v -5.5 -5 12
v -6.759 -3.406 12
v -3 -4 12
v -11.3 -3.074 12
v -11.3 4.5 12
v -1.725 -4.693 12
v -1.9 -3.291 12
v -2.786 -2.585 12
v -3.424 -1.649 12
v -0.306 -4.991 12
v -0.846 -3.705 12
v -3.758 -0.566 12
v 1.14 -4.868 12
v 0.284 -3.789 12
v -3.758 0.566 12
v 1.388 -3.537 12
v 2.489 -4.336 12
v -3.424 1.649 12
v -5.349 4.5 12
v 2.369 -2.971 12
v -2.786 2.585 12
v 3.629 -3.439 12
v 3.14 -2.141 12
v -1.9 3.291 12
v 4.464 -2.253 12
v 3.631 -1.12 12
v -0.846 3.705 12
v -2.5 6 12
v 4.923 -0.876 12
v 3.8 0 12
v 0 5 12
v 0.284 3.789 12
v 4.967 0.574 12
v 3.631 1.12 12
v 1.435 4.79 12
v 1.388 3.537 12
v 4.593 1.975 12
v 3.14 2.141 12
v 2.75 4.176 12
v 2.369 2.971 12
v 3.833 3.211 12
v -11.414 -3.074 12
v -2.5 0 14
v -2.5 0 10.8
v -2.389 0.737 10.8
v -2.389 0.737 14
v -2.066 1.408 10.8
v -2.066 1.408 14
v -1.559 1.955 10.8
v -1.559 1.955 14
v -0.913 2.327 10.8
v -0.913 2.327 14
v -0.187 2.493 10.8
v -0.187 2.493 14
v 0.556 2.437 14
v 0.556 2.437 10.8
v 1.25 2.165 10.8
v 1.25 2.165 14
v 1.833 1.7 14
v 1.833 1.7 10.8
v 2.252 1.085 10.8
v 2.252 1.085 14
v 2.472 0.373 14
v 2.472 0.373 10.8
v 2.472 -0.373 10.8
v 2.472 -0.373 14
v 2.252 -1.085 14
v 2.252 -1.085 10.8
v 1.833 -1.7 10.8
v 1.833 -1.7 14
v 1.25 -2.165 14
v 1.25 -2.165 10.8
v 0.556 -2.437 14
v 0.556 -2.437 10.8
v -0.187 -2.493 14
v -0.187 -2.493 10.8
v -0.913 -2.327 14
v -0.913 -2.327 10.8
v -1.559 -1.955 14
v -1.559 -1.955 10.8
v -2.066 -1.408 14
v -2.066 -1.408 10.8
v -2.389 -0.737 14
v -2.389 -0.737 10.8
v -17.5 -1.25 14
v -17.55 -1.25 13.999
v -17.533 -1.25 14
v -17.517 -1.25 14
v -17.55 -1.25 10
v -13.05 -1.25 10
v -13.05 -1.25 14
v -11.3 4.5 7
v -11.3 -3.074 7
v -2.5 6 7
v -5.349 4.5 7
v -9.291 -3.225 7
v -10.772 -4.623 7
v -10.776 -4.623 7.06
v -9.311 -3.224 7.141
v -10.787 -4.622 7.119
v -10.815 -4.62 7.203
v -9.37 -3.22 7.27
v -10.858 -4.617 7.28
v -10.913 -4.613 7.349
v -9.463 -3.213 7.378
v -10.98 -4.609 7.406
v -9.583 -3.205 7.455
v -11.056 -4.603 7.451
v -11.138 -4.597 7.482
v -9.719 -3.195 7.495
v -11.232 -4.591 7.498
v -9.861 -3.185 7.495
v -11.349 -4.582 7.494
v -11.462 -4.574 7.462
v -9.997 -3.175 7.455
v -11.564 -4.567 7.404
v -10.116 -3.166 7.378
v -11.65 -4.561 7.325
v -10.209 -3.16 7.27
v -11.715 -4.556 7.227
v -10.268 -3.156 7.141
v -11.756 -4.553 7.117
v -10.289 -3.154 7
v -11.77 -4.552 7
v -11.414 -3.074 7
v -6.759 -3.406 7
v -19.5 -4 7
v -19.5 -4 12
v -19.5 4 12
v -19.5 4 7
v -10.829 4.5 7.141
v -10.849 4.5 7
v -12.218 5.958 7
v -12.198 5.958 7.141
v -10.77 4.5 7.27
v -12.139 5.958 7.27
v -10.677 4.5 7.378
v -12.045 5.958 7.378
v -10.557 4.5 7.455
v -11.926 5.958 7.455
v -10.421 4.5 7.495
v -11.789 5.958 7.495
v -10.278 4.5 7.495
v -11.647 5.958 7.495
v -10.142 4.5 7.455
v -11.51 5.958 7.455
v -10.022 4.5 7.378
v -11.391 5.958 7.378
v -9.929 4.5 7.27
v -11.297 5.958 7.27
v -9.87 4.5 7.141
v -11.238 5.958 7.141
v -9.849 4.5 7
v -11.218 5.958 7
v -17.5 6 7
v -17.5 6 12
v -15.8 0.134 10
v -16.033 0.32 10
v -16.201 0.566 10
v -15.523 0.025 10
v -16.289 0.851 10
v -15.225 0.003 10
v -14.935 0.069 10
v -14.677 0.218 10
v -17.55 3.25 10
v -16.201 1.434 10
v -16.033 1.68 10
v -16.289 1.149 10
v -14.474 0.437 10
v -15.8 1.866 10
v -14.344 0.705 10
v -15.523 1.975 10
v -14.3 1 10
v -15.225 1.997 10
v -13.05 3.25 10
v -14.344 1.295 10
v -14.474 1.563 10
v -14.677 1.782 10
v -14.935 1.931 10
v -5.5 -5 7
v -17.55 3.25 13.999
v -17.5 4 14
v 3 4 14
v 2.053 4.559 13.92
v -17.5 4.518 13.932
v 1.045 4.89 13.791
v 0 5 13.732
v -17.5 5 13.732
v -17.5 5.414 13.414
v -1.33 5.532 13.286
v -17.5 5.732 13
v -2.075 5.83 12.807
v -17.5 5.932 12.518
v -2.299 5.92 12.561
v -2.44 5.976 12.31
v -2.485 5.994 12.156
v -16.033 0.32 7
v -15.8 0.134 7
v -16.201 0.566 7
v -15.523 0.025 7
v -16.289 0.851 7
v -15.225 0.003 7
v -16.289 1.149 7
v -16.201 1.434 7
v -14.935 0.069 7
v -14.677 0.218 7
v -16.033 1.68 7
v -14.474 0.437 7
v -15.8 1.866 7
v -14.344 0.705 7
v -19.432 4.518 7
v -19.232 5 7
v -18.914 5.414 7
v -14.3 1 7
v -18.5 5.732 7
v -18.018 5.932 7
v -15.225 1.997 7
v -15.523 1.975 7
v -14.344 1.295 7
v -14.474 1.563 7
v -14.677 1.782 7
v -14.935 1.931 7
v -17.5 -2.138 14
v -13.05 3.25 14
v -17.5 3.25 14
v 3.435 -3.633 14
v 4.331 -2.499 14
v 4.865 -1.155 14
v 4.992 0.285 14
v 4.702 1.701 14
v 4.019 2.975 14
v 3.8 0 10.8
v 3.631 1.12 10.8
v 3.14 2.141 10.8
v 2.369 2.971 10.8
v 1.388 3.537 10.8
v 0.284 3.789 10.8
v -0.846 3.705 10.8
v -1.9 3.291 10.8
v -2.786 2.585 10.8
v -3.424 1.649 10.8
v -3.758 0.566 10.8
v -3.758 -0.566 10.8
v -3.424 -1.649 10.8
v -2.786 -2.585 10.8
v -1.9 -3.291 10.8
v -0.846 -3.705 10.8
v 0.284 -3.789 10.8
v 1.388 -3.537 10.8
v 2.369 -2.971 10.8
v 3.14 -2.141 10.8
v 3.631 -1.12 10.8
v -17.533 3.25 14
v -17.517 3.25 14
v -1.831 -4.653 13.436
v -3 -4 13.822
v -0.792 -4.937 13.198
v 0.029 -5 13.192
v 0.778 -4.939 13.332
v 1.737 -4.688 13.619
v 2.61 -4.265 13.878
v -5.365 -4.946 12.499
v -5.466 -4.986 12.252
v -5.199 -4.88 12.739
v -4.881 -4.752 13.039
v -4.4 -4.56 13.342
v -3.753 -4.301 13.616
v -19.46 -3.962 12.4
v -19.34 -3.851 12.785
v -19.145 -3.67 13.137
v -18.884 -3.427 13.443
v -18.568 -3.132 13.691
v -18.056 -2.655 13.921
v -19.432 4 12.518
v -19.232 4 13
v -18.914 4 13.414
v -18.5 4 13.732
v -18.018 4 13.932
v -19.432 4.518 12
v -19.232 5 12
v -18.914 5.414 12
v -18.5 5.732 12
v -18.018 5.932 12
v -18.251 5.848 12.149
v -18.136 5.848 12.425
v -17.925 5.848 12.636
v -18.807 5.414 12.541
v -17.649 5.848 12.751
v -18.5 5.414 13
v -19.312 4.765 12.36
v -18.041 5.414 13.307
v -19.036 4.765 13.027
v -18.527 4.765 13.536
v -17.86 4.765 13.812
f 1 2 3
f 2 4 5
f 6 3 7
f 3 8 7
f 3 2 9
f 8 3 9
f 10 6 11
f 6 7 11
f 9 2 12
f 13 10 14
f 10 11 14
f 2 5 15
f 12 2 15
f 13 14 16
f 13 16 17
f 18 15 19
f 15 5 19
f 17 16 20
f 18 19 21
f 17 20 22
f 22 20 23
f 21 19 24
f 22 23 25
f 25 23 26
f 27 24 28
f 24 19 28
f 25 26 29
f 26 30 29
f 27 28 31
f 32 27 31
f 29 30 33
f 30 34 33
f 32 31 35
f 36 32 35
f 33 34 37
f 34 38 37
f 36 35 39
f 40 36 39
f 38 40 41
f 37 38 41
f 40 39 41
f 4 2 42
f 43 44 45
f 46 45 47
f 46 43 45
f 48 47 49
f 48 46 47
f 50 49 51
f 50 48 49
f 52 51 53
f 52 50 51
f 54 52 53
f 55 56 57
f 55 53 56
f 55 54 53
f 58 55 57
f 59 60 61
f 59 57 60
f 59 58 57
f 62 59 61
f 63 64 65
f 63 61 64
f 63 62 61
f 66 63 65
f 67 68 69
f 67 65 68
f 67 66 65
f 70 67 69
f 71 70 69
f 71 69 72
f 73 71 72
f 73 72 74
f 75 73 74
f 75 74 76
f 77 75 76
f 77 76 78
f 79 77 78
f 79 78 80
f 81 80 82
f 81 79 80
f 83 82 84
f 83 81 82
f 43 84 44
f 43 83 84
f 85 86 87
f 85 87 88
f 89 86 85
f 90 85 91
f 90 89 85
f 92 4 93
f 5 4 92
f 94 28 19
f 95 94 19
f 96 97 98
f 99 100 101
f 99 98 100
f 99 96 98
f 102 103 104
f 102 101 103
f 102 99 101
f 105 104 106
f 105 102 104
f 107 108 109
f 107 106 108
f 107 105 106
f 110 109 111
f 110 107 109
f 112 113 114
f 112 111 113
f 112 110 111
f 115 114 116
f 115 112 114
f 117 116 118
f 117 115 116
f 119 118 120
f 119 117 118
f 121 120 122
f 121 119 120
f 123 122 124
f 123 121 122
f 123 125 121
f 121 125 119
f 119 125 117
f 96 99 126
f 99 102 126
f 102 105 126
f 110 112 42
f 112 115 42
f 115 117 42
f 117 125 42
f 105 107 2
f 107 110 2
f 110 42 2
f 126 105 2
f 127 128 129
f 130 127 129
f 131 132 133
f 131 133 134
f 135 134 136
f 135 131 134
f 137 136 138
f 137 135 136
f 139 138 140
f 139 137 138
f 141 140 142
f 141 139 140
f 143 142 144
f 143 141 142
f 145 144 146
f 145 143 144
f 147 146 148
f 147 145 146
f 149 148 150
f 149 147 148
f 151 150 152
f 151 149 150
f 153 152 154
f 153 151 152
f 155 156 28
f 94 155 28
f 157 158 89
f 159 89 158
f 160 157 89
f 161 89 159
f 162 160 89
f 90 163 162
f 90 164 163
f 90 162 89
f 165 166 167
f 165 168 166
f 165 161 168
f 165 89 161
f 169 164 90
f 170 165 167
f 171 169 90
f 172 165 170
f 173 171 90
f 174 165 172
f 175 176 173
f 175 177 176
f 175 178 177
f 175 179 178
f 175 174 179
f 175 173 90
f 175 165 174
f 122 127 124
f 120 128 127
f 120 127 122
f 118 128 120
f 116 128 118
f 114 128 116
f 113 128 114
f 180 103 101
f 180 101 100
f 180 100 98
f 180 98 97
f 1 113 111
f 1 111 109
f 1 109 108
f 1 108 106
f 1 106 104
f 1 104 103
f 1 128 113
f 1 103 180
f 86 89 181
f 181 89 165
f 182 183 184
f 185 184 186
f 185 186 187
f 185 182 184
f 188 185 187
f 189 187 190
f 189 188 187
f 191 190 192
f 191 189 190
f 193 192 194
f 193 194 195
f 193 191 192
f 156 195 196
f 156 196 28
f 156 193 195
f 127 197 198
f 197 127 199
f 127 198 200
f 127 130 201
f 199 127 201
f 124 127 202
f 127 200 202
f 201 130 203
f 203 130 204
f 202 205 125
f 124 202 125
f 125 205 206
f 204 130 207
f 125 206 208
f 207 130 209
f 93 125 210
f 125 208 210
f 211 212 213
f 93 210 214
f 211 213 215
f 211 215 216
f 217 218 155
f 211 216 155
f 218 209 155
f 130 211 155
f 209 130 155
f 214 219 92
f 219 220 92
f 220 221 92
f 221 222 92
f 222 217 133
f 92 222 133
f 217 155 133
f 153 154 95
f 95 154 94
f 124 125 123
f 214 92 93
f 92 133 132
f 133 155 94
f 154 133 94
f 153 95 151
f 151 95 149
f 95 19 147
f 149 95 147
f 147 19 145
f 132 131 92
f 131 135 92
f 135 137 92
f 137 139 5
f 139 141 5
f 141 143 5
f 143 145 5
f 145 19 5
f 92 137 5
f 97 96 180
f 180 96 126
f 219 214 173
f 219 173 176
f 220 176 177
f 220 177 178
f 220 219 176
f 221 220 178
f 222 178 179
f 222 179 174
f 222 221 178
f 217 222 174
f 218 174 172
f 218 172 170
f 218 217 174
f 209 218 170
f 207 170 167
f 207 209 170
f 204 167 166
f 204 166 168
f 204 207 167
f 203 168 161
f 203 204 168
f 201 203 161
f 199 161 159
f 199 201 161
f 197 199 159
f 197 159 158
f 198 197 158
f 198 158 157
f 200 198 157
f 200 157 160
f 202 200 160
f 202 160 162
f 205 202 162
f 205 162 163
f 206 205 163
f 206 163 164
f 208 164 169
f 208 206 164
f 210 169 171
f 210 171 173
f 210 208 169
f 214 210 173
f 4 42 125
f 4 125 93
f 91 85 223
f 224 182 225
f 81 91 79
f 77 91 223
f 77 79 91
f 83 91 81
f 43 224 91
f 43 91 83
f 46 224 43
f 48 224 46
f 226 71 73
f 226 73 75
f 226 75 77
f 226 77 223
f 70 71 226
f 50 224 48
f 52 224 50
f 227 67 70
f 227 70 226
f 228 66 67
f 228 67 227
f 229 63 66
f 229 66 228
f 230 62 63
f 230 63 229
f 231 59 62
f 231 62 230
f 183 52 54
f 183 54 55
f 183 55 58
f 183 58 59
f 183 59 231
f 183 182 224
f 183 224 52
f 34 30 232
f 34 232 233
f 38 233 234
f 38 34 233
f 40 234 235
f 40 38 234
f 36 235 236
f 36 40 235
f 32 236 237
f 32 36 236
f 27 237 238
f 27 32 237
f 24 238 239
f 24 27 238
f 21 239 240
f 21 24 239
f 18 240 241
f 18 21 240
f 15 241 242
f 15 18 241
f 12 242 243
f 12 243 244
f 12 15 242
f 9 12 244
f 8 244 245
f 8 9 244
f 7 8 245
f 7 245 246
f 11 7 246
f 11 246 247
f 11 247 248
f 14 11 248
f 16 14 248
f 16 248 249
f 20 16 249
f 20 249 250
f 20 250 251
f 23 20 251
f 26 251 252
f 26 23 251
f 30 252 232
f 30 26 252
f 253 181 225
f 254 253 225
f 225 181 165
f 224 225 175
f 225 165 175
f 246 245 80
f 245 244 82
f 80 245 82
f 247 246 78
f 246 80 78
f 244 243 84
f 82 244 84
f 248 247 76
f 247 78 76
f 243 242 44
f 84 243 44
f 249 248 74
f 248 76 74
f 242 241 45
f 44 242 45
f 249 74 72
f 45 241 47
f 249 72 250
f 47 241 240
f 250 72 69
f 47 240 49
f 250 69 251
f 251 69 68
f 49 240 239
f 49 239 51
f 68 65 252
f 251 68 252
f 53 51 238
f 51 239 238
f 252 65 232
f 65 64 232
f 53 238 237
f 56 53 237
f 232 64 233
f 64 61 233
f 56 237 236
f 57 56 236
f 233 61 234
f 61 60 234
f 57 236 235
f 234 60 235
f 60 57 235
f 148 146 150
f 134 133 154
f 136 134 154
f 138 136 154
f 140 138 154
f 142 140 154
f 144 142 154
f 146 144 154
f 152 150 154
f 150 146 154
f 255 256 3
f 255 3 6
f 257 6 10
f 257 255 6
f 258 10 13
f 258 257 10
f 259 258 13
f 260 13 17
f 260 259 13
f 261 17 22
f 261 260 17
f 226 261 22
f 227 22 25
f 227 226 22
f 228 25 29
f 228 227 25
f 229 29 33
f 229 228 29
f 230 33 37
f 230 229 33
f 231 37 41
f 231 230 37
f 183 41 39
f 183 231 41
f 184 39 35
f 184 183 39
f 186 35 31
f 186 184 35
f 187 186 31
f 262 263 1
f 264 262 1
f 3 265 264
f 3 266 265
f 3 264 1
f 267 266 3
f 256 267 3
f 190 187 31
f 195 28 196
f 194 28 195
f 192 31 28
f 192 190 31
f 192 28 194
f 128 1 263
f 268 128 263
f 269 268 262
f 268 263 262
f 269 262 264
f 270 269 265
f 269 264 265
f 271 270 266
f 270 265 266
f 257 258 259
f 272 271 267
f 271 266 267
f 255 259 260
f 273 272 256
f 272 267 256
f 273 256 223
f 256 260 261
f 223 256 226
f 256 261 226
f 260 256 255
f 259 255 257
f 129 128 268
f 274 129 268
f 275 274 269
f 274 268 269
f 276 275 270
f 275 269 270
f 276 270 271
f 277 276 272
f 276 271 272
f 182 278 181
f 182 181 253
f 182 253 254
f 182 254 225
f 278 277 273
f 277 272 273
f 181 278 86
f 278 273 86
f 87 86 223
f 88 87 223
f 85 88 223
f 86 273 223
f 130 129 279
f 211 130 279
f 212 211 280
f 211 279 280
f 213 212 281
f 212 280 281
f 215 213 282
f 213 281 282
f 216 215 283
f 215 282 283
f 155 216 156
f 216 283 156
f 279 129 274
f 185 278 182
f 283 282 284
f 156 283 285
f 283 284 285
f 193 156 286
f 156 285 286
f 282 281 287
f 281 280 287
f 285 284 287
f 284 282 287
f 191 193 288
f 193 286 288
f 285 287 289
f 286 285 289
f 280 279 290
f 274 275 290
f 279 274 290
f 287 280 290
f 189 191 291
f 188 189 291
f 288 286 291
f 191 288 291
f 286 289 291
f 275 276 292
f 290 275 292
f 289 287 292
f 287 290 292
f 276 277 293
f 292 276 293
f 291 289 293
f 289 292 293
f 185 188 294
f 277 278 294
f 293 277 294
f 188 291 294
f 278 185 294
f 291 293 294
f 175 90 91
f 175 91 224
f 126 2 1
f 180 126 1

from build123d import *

# Parameters (mm, degrees)
BOSS_EXTRUDE1_DEPTH = 2
SKETCH3_R           = 2.5
CUT_EXTRUDE1_DEPTH  = 2
BOSS_EXTRUDE2_DEPTH = 5
FILLET2_R           = 2
SKETCH8_R           = 3.8
SKETCH8_R_2         = 2.5
BOSS_EXTRUDE3_DEPTH = 1.2
SKETCH7_R           = 0.5000000000000009
CUT_EXTRUDE3_DEPTH  = 2
SKETCH15_R          = 0.5000000000000009
CUT_EXTRUDE5_DEPTH  = 3
SKETCH18_W          = 7
SKETCH18_H          = 7.573769237451616
BOSS_EXTRUDE4_DEPTH = 5
SKETCH19_R          = 0.9999999999999996
CUT_EXTRUDE6_DEPTH  = 3
SKETCH20_W          = 4.499999999999998
SKETCH20_H          = 4.5
CUT_EXTRUDE7_DEPTH  = 5


with BuildPart() as part:
    # Sketch2 → Boss-Extrude1 (new body)
    with BuildSketch(Plane.XY):
        with BuildLine():
            Line((0, 5.000000000000001), (-2.5, 6))
            Line((-2.5, 6), (-19.499999999999996, 5.999999999999998))
            Line((-19.499999999999996, 5.999999999999998), (-19.499999999999996, -4.000000000000002))
            Line((-19.499999999999996, -4.000000000000002), (-5.4999999999999964, -4.999999999999999))
            Line((-5.4999999999999964, -4.999999999999999), (-2.999999999999996, -4.0000000000000036))
            ThreePointArc((-2.999999999999996, -4.0000000000000036), (4.743416490252571, -1.5811388300841875), (0, 5.000000000000001))
        make_face()
    extrude(amount=BOSS_EXTRUDE1_DEPTH)

    # Sketch3 → Cut-Extrude1 (cut)
    with BuildSketch(Plane(origin=(0, 0, 0), x_dir=(-1, 0, 0), z_dir=(0, 0, -1))):
        Circle(SKETCH3_R)
    extrude(amount=-CUT_EXTRUDE1_DEPTH, mode=Mode.SUBTRACT)

    # Sketch4 → Boss-Extrude2 (add)
    with BuildSketch(Plane.XY.offset(2)):
        Polygon((-19.499999999999996, -4.000000000000002), (-19.499999999999996, 5.999999999999998), (-2.5, 6), (-5.349362666614333, 4.499999999999999), (-18.299999999999997, 4.499999999999997), (-18.299999999999997, -2.581892623469482), (-6.7590791740868275, -3.4062441110347046), (-5.4999999999999964, -4.999999999999999), (-19.292624540521615, -4.014812532819887), align=None)
    extrude(amount=BOSS_EXTRUDE2_DEPTH)

    # Fillet2
    fillet2_edges = [part.edges().sort_by_distance(p)[0] for p in [
        (-19.499999999999996, 0.9999999999999982, 0),
        (-19.499999999999996, 5.999999999999998, 3.5),
        (-12.499999999999996, -4.5, 0),
        (-10.999999999999998, 5.999999999999999, 0),
    ]]
    fillet(fillet2_edges, radius=FILLET2_R)

    # Sketch8 → Boss-Extrude3 (add)
    with BuildSketch(Plane.XY.offset(2)):
        Circle(SKETCH8_R)
        with Locations(Location((0, 0, 0), (0, 0, 180))):
            Circle(SKETCH8_R_2, mode=Mode.SUBTRACT)
    extrude(amount=BOSS_EXTRUDE3_DEPTH)

    # Sketch7 → Cut-Extrude3 (cut, along a direction that is not the sketch's normal)
    with BuildSketch(Plane.XZ.offset(-4.5)):
        with Locations((-10.349362666614333, 7)):
            Circle(SKETCH7_R)
    extrude(amount=-CUT_EXTRUDE3_DEPTH, dir=(0.6843021216730707, -0.7291986055072609, 0), mode=Mode.SUBTRACT)

    # Sketch15 → Cut-Extrude5 (cut, along a direction that is not the sketch's normal)
    with BuildSketch(Plane(origin=(-0.2763781559826011, -3.869294183756433, 0), x_dir=(0.9974586998307351, -0.07124704998790933, 0), z_dir=(0.07124704998790933, 0.9974586998307351, 0))):
        with Locations((-9.537755541479953, -7)):
            Circle(SKETCH15_R)
    extrude(amount=-CUT_EXTRUDE5_DEPTH, dir=(0.7271985173785733, 0.6864272112339407, 0), mode=Mode.SUBTRACT)

    # Sketch18 → Boss-Extrude4 (add)
    with BuildSketch(Plane.XY.offset(2)):
        with Locations((-14.799999999999997, 0.7131153812741895)):
            Rectangle(SKETCH18_W, SKETCH18_H)
    extrude(amount=BOSS_EXTRUDE4_DEPTH)

    # Sketch19 → Cut-Extrude6 (cut)
    with BuildSketch(Plane.XY.offset(6.999999999999999)):
        with Locations((-15.299999999999997, 0.9999999999999972)):
            Circle(SKETCH19_R)
    extrude(amount=-CUT_EXTRUDE6_DEPTH, mode=Mode.SUBTRACT)

    # Sketch20 → Cut-Extrude7 (cut)
    with BuildSketch(Plane.XY.offset(3.999999999999999)):
        with Locations((-15.299999999999997, 0.9999999999999969)):
            Rectangle(SKETCH20_W, SKETCH20_H)
    extrude(amount=-CUT_EXTRUDE7_DEPTH, mode=Mode.SUBTRACT)

    # Mirror1: part across plane


with BuildPart() as part_1:
    add(part.part)
    add(part.part.mirror(Plane.XY.offset(6.999999999999999)))


with BuildPart() as body_2:
    # Split1: the piece on the far side of the plane
    add(part_1.part)
    split(bisect_by=Plane.XY.offset(6.999999999999999), keep=Keep.BOTTOM)


with BuildPart() as part_2:
    add(part_1.part)

    # Split1
    split(bisect_by=Plane.XY.offset(6.999999999999999), keep=Keep.TOP)


solid = part_2.part
